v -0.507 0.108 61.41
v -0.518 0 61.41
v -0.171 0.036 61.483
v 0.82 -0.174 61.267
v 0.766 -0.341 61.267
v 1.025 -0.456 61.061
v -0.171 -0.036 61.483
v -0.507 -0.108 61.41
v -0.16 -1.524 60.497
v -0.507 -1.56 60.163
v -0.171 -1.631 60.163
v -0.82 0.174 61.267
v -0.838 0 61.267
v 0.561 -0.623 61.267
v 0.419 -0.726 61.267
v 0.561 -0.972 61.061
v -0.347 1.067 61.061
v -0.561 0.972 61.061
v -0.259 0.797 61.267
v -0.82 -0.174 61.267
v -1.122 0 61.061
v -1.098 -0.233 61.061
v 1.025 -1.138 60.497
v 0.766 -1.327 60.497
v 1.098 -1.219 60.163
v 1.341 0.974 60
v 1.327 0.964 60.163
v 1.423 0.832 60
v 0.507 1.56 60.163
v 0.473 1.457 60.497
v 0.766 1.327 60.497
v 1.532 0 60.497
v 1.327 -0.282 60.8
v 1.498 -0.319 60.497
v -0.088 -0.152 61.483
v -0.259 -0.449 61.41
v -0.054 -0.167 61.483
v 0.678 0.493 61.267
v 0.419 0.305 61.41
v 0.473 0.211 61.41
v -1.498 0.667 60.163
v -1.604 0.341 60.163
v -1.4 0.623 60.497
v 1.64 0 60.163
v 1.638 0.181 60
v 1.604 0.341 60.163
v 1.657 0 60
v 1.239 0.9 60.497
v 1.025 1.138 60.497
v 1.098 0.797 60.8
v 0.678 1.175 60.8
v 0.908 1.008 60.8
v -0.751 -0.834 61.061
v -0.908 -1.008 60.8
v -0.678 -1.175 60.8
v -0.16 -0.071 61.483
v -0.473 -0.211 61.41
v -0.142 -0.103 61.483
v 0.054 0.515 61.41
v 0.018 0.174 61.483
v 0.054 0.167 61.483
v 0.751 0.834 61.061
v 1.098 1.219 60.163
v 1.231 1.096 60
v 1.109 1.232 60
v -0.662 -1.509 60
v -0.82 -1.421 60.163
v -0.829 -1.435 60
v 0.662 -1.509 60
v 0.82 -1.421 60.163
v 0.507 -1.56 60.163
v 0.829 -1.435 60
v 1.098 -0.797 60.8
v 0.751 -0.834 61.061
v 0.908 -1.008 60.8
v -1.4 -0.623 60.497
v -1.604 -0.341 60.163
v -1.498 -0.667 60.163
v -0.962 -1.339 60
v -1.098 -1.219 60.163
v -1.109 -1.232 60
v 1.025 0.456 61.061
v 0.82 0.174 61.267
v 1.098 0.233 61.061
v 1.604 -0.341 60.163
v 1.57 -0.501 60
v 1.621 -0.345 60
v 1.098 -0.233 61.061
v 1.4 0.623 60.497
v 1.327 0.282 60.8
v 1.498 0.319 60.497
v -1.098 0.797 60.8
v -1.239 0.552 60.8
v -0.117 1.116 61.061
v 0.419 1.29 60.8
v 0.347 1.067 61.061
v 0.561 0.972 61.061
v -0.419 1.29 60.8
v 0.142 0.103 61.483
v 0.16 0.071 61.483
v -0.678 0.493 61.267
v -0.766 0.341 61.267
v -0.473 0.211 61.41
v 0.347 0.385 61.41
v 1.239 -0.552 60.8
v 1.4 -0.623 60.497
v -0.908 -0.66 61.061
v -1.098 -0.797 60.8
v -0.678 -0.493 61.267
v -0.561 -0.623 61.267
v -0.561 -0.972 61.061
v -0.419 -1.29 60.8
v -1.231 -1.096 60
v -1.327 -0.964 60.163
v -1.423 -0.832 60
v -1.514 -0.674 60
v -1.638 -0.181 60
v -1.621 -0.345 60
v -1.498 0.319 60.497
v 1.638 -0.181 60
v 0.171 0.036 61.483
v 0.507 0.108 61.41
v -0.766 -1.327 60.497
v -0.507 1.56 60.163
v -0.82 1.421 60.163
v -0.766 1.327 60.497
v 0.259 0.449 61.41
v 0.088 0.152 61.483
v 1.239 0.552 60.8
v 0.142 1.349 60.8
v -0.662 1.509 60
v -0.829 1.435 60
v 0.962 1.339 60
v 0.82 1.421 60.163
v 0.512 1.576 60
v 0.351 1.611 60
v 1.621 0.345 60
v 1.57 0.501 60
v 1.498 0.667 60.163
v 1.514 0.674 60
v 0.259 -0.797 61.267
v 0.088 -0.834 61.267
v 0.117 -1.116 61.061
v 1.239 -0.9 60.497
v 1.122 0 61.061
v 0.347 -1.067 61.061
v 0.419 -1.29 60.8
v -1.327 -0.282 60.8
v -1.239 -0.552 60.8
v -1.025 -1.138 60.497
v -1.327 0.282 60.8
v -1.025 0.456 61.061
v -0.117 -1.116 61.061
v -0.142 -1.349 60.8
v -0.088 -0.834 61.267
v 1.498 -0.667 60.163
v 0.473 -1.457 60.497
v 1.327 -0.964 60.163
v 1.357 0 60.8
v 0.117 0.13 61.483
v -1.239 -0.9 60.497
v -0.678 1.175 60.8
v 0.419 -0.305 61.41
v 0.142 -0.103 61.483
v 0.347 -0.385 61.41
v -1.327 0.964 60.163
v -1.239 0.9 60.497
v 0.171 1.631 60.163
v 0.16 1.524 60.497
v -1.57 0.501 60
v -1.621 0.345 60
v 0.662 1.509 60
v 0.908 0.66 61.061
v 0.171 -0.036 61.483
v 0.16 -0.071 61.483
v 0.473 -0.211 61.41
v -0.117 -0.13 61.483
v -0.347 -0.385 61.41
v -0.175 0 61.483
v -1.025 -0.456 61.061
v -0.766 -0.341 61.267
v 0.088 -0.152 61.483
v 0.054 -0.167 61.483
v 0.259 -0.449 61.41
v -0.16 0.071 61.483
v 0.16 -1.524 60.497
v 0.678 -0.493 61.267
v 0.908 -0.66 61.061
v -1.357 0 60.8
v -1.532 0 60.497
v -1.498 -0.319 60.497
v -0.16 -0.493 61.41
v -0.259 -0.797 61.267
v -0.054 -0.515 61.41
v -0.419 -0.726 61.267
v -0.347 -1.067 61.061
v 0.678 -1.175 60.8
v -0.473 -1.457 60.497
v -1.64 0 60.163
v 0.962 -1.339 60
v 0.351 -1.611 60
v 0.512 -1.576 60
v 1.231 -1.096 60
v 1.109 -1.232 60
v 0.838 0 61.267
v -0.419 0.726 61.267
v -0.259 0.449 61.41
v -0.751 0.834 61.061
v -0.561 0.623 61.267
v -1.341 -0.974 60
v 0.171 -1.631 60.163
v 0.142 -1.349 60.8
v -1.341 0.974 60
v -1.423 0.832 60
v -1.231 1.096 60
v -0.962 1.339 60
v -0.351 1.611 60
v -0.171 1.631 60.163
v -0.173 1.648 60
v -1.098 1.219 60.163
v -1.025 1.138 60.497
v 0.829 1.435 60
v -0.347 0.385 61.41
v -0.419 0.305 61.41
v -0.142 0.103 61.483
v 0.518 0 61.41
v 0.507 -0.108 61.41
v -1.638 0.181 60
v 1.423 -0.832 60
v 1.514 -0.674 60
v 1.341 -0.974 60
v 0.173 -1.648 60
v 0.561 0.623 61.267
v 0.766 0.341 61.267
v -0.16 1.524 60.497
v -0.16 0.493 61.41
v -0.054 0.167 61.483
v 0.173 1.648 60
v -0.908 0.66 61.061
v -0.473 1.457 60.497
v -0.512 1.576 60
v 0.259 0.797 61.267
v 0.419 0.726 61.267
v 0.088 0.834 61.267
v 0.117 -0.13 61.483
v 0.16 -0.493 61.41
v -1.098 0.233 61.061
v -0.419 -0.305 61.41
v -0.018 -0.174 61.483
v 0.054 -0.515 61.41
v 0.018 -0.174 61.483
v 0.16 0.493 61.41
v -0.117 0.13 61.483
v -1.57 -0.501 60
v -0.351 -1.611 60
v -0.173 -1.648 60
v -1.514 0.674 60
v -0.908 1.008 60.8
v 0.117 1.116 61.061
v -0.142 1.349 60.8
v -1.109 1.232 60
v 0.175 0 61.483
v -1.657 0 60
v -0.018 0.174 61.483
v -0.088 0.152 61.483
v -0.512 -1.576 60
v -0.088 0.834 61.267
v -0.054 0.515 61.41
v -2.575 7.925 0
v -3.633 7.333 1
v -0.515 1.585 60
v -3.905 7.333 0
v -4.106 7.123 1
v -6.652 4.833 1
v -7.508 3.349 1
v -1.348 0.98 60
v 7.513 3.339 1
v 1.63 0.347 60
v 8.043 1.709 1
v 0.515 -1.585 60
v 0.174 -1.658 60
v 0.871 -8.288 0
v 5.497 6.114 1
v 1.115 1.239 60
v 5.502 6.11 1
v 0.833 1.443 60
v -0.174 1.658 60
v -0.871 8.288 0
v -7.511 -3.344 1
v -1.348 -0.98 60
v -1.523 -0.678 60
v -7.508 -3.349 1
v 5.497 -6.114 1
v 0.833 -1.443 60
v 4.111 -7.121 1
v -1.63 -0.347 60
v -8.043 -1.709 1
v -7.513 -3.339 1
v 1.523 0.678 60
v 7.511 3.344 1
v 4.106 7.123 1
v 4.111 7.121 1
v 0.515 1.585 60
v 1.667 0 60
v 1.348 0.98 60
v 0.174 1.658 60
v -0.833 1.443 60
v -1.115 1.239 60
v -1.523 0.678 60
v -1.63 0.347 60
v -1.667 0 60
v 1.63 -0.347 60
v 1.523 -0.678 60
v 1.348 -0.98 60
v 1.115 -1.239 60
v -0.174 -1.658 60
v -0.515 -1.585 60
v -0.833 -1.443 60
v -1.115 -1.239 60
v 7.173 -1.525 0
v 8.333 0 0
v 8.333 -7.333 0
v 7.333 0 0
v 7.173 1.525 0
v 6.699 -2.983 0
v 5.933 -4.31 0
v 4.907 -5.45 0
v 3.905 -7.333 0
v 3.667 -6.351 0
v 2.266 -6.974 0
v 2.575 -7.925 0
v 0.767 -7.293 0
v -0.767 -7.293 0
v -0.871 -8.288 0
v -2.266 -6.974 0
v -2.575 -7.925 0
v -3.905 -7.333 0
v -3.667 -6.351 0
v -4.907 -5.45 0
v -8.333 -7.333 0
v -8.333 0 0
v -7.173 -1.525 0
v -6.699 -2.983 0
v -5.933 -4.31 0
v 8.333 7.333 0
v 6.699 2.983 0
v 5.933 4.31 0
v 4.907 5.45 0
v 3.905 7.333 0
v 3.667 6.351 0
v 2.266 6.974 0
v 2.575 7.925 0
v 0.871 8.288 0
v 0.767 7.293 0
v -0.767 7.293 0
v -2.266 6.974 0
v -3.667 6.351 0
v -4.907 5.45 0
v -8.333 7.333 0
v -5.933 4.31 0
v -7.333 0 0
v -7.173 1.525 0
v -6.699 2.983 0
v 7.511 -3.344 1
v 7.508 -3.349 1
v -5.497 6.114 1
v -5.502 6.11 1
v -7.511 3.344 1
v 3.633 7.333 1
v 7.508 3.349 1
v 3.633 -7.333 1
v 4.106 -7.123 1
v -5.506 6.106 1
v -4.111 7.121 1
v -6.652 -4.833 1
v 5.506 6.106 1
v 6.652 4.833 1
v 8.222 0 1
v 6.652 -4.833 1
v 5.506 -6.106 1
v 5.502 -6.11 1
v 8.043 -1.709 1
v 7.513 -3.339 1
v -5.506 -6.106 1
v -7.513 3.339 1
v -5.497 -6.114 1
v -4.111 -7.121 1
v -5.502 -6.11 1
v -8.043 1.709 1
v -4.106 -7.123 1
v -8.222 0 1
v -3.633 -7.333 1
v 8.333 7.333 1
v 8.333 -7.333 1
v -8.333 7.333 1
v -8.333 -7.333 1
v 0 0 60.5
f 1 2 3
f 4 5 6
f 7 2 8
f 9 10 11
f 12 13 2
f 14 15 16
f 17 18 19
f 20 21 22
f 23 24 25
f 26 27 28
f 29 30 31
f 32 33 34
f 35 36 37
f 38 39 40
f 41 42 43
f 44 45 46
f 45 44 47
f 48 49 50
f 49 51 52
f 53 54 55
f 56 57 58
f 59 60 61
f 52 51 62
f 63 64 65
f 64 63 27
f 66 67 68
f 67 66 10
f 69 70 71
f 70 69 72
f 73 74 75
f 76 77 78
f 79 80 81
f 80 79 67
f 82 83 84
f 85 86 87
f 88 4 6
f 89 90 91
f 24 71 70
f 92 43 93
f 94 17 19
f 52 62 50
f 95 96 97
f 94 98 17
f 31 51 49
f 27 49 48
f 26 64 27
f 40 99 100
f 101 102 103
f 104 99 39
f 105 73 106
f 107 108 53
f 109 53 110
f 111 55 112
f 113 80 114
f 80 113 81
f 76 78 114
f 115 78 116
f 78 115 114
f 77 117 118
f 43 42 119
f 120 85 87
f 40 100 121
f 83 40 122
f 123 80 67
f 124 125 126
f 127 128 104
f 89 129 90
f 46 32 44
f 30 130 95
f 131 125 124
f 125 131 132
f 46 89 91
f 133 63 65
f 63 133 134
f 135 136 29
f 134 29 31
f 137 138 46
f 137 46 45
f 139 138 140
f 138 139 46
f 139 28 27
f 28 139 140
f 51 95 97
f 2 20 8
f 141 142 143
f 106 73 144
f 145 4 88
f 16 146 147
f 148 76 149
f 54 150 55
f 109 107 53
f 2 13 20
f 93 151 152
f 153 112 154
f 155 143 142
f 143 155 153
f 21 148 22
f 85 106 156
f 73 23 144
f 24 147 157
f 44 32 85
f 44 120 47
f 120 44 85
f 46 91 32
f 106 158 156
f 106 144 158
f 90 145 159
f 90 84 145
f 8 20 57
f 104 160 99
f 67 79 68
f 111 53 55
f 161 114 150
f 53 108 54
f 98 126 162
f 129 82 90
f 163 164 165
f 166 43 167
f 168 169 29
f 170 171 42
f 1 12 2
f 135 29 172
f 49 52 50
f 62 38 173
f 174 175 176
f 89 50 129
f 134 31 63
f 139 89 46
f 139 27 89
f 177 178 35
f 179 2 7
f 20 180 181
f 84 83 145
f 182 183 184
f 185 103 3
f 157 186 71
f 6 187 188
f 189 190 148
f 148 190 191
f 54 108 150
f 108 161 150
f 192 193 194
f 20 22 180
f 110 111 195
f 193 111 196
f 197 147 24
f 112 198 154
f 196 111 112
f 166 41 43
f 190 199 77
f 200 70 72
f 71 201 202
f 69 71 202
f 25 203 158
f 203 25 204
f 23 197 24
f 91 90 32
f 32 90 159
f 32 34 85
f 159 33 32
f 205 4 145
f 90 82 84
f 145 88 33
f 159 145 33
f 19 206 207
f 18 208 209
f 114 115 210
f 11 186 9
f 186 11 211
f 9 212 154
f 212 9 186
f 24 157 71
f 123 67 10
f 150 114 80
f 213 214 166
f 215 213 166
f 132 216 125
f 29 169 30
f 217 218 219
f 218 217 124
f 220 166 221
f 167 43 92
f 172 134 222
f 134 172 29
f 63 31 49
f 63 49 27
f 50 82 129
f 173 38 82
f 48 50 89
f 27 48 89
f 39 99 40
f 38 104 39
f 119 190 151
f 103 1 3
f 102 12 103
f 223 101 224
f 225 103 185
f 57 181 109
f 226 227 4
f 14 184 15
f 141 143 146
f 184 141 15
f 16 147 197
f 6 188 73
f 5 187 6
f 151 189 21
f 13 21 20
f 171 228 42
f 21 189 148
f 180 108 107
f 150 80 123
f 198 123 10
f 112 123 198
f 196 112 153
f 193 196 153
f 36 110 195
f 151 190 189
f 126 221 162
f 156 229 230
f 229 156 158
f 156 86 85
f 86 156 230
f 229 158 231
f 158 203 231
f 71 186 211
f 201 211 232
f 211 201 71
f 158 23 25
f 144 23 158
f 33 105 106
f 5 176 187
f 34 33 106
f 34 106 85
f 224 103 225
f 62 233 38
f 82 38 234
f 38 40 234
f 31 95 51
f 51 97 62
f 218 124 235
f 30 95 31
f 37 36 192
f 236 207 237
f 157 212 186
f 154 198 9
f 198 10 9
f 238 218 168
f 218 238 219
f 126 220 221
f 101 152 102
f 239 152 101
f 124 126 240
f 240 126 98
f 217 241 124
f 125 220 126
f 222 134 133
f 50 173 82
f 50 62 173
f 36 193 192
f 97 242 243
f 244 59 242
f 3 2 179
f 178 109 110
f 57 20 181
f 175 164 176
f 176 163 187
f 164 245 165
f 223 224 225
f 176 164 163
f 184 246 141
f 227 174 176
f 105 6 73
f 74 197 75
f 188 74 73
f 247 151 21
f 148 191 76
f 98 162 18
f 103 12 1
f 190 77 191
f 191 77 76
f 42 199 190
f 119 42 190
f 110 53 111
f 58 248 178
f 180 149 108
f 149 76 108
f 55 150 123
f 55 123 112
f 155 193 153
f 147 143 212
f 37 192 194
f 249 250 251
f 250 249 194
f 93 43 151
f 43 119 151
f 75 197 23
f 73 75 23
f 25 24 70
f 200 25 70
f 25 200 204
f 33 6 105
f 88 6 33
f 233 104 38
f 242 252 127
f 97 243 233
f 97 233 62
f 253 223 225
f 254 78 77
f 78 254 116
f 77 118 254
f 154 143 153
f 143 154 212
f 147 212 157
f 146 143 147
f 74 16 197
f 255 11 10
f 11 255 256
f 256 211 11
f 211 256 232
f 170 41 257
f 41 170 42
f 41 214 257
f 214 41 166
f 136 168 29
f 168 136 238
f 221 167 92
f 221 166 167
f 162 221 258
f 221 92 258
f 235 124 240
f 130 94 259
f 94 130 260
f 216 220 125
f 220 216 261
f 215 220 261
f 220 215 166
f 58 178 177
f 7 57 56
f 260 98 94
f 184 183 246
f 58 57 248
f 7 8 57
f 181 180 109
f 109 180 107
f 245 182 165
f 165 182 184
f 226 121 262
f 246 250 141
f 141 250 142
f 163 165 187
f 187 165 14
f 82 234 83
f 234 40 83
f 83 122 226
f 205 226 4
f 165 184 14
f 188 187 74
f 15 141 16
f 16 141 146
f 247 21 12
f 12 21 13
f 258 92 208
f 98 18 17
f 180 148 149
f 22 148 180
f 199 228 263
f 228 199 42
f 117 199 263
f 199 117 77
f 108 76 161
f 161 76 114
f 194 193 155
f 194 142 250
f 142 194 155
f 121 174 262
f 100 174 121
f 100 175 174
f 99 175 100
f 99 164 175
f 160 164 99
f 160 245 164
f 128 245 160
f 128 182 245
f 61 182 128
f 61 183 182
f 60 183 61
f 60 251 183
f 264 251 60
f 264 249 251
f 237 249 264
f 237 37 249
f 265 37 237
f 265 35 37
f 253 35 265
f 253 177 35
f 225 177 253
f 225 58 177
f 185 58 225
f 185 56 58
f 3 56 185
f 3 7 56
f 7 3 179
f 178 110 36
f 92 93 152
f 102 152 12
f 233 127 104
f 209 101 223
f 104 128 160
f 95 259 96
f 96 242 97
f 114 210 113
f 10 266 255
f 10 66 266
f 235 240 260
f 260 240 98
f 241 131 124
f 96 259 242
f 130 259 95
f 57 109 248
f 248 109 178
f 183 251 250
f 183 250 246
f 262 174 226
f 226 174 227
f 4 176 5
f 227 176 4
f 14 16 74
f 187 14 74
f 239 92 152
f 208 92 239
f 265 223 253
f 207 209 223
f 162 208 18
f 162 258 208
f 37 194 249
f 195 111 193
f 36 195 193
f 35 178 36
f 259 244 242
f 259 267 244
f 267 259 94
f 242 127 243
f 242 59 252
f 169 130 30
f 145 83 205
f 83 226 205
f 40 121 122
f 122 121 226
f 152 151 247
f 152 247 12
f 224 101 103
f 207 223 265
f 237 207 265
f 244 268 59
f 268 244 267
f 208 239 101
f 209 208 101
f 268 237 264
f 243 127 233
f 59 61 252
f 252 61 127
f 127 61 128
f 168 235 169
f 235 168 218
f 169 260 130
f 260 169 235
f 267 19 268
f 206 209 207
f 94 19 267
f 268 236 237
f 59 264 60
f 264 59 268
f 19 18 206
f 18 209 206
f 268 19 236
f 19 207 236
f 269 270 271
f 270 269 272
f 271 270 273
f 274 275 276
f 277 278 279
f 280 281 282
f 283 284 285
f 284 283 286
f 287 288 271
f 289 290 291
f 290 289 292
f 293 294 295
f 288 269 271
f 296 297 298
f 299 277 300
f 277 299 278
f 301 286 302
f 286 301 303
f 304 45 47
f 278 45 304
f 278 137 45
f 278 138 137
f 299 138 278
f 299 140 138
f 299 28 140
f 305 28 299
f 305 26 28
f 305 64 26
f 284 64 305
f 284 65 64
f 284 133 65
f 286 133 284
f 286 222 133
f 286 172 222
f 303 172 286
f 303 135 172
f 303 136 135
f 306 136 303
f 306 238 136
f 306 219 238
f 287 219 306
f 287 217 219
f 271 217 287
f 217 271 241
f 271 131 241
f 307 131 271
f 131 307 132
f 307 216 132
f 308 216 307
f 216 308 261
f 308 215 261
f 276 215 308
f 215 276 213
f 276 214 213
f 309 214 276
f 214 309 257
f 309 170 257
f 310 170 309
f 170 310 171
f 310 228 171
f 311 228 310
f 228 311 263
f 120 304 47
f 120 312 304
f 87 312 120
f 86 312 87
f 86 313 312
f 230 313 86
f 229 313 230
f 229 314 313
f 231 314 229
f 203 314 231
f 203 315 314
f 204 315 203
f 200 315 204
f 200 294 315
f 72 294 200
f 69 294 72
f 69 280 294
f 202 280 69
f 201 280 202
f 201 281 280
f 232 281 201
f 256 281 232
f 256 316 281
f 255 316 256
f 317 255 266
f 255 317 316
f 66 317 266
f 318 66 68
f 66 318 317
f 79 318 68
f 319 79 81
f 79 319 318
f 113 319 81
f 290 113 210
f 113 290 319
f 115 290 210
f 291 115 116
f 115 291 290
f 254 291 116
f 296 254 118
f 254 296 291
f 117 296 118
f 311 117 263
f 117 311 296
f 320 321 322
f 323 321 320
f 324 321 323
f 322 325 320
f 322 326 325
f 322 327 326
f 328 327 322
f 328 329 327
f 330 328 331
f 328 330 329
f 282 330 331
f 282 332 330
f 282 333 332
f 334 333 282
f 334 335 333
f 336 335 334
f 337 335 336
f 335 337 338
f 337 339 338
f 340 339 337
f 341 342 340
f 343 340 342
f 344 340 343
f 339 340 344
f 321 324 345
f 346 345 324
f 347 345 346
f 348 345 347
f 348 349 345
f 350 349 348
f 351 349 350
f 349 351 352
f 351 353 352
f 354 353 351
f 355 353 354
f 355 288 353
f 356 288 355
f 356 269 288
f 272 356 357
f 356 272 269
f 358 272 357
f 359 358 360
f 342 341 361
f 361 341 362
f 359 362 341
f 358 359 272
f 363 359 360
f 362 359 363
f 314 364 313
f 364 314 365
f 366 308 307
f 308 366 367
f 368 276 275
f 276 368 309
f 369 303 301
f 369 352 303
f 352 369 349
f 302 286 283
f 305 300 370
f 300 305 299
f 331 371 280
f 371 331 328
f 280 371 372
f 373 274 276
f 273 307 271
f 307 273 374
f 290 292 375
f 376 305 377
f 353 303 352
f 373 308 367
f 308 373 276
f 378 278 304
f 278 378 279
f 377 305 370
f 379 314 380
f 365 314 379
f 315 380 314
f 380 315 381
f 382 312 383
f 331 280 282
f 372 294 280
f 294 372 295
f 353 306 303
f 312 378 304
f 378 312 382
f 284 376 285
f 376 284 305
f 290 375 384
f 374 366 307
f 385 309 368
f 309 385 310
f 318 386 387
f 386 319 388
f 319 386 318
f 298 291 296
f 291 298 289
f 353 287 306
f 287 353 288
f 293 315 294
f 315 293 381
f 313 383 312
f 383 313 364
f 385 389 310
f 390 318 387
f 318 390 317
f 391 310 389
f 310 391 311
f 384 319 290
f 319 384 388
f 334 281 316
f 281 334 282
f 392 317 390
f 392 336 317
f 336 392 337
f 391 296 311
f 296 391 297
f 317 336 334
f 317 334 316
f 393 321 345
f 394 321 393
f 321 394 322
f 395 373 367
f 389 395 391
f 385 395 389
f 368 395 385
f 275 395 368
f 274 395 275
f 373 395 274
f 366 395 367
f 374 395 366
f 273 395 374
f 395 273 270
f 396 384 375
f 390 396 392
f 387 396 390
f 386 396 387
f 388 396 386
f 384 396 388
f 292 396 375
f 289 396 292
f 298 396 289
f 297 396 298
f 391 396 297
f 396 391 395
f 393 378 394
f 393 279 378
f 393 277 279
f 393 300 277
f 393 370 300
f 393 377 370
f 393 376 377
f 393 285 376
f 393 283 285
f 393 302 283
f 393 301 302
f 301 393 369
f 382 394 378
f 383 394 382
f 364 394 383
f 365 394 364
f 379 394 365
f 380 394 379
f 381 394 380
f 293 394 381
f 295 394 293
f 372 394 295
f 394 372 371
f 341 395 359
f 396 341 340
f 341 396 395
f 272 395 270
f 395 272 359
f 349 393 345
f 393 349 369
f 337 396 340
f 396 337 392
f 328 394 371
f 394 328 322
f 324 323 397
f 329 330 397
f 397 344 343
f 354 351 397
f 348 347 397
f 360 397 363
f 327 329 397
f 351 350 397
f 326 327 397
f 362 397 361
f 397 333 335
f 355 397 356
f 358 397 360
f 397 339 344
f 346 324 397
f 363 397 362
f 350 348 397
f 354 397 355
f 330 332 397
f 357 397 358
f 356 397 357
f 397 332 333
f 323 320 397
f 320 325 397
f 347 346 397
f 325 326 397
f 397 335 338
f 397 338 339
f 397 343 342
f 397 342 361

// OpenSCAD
barThickness = 1.0;
wallThickness = 1.0;
heightHigh = 75; 
heightLow = 15;
width = 16.66667;
percentRound = 0.2;
numCones = 1;
LEDWidth = 1000/60;
spacerX = LEDWidth-width;
barX = numCones*(width+spacerX)+spacerX;
barY = width-2;
masterFN=30; //100 or 3,4,5

N = numCones - 1;
slope = N==0 ? 0 : (heightHigh-heightLow)/(N/2);
function localHeightRising(i) = slope*i+heightLow;
function localHeightFalling(i) = heightLow-slope*(i-N);
function flatten(l) = [ for (a = l) for (b = a) b ] ;
halfN = floor(N/2);
//heights = flatten( [ [ for (i=[0:halfN]) localHeightRising(i) ], 
//    [ for (i=[halfN+1:N]) localHeightFalling(i) ] ] );
heights = [ heightHigh ];
echo(heights);    

module bar(thickness) {
    translate([-width/2-spacerX,-barY/2,0]) {
        cube([numCones*(width+spacerX)+spacerX,barY,thickness]);
    }
}
module translatedRoundCone(h,w,i)
{
    translate([i*(width+spacerX),0,0]) {
        roundCone(h,w);
    }
}

module translatedCone(h,w,i)
{
    translate([i*(width+spacerX),0,0]) {
        cylinder(h=h,d1=w,d2=0,$fn=masterFN);
    }
}

module roundCone(h,w)
{
    z = h*percentRound;
    echo(z);
    m = 2*h/w;
    x = z/m;
    theta = atan(z/x);
    phi = 90-theta;
    y = x*tan(phi);
    echo(y);
    radius = sqrt(x*x+y*y);
    echo(radius);
    topDiameter = 2*x;
    echo(z+y-radius);
    
    union() {
        cylinder(h=h-z,d1=w,d2=topDiameter,$fn=masterFN);
        translate([0,0,h-z-y]) {
            difference() {
                sphere(r=radius,$fn=masterFN);
                translate([-radius,-radius,-radius-z]) {
                    cube([2*radius,2*radius,2*radius]);
                }
            }
        }
    }
}

module conesWithBar(barThick,wallThick) {
difference() {
    union() { 
        bar(barThick);
        for (i=[0:N]) {
           translatedRoundCone(heights[i],width,i);
        }
    }
    for (i=[0:N]) {
        //translatedRoundCone(heights[i]-wallThickness,width-2*wallThickness,i);
        translatedCone(heights[i]-13.5-wallThickness,width-2*wallThickness,i);
    }
}
}

conesWithBar(barThickness,wallThickness);
